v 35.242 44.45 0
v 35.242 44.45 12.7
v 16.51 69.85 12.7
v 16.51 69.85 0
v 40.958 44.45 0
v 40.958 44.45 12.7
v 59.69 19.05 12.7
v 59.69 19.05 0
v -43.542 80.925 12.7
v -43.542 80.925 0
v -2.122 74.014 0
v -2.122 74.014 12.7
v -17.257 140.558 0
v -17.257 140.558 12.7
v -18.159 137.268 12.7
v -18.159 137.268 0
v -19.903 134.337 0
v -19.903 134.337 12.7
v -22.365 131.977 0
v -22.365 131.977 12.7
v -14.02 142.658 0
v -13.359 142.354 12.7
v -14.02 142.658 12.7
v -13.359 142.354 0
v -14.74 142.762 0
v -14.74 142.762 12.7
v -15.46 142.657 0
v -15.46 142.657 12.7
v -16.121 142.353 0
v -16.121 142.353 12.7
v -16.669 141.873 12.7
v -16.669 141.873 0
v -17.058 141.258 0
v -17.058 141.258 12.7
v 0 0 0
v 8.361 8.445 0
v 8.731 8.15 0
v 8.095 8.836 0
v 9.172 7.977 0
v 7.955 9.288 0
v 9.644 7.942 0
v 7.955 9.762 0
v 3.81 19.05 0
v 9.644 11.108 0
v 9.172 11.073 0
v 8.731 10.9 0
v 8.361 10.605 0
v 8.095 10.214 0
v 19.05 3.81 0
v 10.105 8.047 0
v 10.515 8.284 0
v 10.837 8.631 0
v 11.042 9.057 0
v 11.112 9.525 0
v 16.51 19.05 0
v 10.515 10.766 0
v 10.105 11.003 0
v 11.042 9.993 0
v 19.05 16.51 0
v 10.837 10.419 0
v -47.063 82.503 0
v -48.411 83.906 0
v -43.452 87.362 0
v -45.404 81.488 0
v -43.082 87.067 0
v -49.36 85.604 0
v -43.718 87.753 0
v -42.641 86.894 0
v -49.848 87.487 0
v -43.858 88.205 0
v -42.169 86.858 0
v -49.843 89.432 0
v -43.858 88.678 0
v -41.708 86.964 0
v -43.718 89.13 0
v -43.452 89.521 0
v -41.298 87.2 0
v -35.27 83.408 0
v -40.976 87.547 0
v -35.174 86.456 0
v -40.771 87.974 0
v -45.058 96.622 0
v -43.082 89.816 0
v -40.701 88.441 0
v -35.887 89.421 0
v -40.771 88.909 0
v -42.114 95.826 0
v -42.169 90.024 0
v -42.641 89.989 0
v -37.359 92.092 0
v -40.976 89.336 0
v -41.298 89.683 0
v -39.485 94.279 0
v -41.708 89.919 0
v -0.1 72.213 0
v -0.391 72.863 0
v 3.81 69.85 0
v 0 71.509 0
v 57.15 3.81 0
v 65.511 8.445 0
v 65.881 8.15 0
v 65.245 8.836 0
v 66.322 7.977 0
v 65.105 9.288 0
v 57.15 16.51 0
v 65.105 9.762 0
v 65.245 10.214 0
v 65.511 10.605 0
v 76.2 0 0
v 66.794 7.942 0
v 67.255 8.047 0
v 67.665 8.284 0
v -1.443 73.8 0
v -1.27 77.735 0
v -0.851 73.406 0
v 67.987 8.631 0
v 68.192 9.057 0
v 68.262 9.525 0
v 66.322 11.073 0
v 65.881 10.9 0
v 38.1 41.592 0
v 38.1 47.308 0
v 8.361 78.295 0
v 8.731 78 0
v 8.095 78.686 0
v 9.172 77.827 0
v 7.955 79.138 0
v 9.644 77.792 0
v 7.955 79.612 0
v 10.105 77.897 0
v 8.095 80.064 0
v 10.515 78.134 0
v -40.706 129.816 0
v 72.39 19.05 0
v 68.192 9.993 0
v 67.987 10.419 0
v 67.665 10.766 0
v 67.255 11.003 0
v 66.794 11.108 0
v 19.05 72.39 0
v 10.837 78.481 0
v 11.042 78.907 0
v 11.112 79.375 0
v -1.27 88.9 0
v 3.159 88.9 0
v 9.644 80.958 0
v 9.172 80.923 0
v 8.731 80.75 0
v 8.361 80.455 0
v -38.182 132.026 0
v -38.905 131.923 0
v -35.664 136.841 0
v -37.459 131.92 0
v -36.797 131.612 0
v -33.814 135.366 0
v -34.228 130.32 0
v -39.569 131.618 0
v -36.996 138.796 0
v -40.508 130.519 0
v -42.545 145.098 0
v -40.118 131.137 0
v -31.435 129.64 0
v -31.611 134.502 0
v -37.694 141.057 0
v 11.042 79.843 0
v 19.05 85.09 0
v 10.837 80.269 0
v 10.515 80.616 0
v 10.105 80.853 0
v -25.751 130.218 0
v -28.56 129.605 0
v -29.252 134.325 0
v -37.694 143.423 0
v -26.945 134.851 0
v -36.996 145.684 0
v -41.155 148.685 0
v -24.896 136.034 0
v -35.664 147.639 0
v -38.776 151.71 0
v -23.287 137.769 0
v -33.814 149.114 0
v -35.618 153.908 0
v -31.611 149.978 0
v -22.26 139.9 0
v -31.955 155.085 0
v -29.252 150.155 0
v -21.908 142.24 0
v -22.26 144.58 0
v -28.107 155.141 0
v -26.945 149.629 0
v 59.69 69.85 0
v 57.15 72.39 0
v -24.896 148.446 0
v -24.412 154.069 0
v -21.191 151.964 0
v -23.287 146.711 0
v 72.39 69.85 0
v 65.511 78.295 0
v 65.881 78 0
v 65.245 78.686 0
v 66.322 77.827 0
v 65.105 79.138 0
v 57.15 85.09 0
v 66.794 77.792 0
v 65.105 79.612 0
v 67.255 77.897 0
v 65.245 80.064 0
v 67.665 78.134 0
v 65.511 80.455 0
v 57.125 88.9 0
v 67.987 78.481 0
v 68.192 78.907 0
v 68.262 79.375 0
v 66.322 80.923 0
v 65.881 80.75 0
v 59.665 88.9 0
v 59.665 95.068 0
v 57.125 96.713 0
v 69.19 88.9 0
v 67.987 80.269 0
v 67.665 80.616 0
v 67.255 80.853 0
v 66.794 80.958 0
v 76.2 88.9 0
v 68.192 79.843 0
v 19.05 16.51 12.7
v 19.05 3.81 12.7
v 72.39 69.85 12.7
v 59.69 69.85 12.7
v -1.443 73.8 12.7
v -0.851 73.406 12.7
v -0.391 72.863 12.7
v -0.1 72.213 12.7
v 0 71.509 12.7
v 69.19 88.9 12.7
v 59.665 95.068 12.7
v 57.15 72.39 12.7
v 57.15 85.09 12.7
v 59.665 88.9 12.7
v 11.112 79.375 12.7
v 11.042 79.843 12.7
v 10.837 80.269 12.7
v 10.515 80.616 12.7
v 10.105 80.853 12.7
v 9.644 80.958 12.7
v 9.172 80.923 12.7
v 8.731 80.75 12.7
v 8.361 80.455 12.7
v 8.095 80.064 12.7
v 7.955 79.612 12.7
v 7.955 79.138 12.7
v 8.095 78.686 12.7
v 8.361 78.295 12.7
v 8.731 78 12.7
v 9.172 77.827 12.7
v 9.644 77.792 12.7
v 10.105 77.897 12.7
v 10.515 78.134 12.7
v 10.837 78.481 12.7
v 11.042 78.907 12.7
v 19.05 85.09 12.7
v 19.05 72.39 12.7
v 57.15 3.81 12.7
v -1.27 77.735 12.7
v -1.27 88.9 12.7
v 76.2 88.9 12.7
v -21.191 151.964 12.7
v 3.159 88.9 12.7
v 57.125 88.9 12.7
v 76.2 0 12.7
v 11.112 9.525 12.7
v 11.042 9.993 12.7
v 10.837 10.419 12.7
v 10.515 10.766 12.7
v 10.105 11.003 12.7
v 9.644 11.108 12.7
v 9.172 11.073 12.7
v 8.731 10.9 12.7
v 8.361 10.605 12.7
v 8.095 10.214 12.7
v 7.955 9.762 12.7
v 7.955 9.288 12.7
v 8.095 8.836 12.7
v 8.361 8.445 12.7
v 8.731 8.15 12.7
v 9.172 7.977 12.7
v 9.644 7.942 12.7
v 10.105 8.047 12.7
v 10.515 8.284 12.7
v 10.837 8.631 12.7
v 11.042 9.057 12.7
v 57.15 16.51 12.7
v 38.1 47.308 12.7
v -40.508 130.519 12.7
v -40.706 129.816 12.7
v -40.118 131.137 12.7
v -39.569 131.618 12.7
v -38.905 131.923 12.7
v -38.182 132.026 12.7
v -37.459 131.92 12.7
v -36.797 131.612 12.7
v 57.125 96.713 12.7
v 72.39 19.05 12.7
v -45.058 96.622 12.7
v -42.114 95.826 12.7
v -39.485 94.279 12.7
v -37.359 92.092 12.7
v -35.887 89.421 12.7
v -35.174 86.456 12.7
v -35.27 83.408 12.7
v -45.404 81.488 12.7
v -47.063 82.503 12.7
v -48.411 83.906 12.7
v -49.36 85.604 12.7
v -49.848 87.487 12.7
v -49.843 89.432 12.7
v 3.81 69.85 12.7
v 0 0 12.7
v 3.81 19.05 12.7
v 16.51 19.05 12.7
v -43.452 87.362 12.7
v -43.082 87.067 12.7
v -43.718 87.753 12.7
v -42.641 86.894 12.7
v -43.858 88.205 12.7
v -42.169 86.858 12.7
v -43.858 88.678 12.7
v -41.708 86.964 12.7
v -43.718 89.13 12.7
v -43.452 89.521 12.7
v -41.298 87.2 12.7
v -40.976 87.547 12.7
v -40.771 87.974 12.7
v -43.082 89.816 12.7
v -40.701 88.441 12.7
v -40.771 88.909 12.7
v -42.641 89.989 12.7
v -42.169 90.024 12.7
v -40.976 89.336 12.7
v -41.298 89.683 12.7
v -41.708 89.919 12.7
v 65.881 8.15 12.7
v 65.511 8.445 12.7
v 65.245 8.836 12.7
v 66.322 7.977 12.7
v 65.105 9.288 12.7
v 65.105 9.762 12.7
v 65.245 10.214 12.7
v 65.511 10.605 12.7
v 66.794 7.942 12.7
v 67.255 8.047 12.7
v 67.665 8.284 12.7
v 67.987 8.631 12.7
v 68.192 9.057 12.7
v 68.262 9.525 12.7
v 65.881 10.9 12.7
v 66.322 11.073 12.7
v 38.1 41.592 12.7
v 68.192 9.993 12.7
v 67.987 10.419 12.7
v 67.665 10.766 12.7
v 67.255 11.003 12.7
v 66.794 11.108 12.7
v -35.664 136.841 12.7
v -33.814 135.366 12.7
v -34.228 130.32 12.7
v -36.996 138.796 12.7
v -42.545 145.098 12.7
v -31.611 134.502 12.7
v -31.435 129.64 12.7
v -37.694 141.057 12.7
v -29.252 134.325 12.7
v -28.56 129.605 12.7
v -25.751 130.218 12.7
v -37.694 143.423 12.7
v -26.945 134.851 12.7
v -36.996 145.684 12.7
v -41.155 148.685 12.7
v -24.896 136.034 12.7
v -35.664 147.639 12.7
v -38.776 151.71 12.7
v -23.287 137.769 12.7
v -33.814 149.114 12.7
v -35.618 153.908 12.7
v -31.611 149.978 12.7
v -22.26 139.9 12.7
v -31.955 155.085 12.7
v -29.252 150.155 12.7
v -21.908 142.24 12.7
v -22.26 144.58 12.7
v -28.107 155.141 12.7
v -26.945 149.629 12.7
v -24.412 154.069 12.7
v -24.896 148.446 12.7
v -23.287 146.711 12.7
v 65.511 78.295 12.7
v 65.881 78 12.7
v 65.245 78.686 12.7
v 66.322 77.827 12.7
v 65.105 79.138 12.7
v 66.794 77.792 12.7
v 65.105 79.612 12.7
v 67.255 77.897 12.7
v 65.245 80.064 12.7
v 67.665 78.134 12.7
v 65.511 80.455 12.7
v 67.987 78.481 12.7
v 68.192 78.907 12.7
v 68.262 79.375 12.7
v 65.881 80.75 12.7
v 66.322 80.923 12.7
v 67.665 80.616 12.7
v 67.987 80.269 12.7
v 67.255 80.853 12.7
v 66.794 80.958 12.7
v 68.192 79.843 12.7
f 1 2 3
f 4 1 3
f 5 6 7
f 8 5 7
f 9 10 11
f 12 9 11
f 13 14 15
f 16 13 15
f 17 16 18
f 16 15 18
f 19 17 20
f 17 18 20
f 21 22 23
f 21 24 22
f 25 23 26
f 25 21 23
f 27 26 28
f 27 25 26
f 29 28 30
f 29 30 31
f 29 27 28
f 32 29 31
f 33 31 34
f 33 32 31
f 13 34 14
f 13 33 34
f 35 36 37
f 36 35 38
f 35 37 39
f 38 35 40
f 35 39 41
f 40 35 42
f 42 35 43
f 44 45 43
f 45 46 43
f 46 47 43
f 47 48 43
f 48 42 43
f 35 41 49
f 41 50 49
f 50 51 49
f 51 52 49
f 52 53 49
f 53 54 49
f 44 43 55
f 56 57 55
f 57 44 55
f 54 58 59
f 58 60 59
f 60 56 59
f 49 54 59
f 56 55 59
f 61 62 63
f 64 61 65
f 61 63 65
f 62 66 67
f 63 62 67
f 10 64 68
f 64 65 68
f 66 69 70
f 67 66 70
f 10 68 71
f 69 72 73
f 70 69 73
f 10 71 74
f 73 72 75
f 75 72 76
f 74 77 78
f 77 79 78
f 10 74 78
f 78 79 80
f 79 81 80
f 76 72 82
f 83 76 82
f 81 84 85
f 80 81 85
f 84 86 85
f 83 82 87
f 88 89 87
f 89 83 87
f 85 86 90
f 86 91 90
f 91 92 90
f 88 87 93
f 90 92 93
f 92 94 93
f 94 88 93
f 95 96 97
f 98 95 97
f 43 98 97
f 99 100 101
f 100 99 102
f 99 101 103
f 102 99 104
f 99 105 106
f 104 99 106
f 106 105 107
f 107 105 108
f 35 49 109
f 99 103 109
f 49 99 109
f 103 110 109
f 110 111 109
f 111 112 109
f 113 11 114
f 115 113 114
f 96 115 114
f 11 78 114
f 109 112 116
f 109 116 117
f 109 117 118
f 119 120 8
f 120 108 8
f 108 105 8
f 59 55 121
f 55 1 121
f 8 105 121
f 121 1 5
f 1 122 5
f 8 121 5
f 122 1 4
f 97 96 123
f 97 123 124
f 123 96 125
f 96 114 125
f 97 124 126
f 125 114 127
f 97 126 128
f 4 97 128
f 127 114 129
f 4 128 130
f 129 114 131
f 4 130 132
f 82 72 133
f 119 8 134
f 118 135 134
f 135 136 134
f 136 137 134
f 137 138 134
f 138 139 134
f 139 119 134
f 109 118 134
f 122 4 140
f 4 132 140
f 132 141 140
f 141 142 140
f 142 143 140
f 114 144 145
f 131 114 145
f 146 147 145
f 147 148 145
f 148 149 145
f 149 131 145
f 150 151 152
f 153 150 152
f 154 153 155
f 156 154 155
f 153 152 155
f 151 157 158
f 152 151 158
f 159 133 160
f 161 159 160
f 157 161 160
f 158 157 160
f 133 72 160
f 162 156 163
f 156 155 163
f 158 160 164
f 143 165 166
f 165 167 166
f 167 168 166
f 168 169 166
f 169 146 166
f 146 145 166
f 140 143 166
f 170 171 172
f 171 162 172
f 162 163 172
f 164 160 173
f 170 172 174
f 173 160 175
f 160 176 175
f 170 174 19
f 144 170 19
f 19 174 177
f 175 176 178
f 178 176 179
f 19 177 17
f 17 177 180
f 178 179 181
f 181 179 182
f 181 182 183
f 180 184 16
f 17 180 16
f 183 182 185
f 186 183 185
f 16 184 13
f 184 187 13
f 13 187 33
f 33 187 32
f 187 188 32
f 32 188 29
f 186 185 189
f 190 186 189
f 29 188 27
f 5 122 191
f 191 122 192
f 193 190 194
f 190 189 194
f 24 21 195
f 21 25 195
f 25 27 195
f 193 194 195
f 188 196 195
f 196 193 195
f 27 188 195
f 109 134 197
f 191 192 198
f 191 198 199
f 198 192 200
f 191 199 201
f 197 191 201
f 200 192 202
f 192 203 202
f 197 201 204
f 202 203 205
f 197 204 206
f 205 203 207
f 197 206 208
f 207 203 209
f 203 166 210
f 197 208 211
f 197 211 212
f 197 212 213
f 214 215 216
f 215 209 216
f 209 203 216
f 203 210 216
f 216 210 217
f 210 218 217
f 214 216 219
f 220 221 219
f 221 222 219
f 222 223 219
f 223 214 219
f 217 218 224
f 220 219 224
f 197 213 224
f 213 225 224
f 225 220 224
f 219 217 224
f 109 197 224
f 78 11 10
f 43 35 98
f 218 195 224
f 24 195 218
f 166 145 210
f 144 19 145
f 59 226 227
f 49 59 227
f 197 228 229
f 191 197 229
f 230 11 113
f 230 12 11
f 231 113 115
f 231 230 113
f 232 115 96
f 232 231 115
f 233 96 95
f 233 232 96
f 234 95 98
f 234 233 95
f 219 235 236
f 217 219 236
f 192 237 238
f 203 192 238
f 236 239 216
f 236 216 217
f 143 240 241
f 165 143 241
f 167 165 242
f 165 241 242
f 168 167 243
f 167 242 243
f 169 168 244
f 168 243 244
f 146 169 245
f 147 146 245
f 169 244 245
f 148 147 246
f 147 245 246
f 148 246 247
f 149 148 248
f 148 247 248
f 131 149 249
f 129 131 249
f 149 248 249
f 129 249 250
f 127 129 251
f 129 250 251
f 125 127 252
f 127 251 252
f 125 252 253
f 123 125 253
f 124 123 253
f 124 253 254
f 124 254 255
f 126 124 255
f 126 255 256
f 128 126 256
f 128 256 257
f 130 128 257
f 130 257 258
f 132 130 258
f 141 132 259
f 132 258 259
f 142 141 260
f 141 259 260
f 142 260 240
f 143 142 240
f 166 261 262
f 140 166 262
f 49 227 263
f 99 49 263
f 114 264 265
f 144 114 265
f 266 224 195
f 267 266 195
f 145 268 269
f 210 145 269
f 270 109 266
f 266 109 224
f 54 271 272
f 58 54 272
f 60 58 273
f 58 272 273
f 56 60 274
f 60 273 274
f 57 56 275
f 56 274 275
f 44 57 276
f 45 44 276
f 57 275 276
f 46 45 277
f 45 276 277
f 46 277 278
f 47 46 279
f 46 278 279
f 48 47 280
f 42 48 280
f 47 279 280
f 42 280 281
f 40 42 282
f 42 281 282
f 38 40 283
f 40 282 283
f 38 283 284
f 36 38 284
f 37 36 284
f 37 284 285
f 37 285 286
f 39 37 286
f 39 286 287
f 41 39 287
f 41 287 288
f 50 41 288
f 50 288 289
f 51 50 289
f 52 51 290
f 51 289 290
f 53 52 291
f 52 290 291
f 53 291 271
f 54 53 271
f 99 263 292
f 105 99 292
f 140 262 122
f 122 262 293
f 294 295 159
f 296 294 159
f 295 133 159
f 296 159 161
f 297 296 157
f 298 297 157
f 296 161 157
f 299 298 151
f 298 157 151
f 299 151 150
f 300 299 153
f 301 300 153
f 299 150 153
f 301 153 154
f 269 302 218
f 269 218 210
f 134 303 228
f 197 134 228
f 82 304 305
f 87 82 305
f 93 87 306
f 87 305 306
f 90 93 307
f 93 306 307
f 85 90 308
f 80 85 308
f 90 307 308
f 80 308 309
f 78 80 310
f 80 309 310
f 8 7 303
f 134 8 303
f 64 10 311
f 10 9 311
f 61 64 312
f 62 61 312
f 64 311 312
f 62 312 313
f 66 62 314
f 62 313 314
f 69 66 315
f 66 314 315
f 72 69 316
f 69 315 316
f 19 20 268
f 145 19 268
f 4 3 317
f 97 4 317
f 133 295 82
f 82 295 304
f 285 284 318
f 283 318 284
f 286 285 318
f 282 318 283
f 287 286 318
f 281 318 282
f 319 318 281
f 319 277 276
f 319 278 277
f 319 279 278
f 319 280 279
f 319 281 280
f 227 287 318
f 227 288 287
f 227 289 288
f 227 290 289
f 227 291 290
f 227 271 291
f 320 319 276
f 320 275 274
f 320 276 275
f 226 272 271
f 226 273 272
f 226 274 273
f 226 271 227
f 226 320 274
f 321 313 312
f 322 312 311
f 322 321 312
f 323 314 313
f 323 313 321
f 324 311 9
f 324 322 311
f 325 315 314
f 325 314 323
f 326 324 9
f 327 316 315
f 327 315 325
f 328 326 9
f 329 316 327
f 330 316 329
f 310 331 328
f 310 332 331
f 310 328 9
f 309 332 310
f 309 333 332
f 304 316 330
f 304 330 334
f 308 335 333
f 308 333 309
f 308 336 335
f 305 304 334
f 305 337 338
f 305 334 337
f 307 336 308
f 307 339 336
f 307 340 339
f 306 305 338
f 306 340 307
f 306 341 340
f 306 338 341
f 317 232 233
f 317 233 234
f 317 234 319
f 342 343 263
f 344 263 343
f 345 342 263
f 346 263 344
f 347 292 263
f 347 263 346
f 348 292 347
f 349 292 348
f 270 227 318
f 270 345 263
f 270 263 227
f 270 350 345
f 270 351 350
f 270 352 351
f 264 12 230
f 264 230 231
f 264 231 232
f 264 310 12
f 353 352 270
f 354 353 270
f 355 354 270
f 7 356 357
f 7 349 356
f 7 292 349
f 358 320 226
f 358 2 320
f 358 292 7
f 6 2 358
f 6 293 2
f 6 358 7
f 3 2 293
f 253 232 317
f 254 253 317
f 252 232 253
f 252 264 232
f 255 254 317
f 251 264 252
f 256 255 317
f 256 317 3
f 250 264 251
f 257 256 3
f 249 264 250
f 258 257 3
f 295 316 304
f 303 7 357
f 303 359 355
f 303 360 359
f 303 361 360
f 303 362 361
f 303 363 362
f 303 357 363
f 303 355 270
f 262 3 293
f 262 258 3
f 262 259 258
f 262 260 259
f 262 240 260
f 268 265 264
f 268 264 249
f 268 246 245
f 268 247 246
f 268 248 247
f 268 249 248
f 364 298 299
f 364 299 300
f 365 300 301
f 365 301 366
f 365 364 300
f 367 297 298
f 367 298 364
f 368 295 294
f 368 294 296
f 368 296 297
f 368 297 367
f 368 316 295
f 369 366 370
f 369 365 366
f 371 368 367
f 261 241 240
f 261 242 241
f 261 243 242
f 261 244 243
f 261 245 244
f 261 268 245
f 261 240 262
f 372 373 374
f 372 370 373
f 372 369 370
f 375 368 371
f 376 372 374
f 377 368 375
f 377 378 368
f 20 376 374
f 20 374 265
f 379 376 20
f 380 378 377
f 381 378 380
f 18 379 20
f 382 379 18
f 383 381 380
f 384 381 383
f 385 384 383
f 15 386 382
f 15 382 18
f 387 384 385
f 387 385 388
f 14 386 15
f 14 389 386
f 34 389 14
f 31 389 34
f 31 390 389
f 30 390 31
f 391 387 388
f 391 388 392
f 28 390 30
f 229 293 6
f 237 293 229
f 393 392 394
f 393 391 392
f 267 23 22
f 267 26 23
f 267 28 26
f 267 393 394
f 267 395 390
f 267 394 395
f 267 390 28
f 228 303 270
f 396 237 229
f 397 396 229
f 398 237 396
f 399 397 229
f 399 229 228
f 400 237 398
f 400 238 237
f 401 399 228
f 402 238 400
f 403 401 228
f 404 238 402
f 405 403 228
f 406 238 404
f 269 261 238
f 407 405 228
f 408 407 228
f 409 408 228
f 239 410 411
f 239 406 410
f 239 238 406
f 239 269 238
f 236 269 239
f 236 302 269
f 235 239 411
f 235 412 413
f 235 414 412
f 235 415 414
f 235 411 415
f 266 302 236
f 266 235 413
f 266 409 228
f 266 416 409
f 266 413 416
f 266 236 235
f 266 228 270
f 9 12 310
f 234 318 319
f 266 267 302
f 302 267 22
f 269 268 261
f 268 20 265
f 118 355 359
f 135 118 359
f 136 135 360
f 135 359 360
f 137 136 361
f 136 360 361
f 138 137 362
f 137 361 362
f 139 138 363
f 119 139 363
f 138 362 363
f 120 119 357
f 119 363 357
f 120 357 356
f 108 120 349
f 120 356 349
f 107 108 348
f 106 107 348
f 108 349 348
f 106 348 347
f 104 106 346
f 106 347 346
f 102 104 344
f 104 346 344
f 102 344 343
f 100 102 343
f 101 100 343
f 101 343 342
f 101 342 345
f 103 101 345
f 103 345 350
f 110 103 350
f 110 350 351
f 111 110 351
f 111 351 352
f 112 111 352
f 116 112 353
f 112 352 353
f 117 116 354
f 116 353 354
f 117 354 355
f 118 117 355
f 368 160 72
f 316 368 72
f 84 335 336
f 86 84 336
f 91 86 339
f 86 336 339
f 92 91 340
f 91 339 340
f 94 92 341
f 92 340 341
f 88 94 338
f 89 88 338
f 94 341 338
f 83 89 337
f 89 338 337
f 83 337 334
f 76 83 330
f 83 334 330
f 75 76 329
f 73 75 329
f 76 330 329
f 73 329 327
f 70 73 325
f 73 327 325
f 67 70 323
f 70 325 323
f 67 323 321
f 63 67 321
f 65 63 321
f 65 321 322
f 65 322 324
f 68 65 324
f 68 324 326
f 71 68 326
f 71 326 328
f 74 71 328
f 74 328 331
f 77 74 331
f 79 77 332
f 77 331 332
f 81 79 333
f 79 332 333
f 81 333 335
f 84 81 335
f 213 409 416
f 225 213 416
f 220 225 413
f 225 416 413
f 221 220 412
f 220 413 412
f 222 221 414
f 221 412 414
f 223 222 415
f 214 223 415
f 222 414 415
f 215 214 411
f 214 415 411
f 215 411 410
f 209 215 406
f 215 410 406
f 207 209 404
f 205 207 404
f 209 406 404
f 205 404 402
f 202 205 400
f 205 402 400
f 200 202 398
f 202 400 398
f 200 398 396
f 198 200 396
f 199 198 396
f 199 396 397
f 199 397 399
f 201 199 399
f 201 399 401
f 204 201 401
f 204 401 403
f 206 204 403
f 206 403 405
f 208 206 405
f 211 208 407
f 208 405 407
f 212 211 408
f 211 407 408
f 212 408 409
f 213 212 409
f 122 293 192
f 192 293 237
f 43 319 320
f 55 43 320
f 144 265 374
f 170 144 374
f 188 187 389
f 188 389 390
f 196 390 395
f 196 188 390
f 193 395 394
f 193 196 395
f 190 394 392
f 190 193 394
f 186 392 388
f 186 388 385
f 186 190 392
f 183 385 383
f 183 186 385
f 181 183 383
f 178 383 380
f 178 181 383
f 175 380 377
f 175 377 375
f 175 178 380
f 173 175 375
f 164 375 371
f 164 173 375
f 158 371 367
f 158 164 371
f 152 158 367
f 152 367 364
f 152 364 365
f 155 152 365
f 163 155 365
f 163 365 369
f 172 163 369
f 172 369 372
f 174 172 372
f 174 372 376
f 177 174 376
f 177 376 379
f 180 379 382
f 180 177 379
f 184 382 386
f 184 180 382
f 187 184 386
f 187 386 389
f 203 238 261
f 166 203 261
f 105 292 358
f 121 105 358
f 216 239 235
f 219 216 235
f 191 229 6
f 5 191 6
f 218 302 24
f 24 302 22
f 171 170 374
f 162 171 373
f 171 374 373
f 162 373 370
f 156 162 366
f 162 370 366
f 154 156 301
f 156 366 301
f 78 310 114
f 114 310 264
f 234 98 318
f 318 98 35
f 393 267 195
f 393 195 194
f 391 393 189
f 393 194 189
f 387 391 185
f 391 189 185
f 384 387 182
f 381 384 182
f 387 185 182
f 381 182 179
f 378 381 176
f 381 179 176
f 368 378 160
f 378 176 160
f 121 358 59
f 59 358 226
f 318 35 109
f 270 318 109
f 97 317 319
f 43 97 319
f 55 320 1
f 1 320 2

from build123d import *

# Parameters (mm, degrees)
SKETCH1_R           = 7.9375
BOSS_EXTRUDE1_DEPTH = 12.7
CUT_EXTRUDE1_DEPTH  = 12.7
SKETCH3_R           = 1.5875
CUT_EXTRUDE2_DEPTH  = 12.7
CUT_EXTRUDE3_DEPTH  = 12.7
FILLET1_R           = 2.54
BOSS_EXTRUDE2_DEPTH = 12.7
SKETCH6_R           = 1.5875
CUT_EXTRUDE4_DEPTH  = 12.7
FILLET2_R           = 7.62
FILLET3_R           = 2.54


with BuildPart() as part:
    # Sketch1 → Boss-Extrude1 (new body)
    with BuildSketch(Plane.XY):
        with BuildLine():
            Line((0, 0), (76.2, 0))
            Line((76.2, 0), (76.2, 88.9))
            Line((76.2, 88.9), (-21.190795437, 151.964199177))
            ThreePointArc((-21.190795437, 151.964199177), (-33.829972343, 154.632550249), (-42.545, 145.0975))
            Line((-42.545, 145.0975), (-50.8, 82.136361391))
            Line((-50.8, 82.136361391), (0, 73.66))
            Line((0, 73.66), (0, 0))
        make_face()
        with Locations((-29.845, 142.24)):
            Circle(SKETCH1_R, mode=Mode.SUBTRACT)
    extrude(amount=BOSS_EXTRUDE1_DEPTH)

    # Sketch2 → Cut-Extrude1 (cut)
    with BuildSketch(Plane.XY.offset(12.7)):
        Polygon((19.05, 3.81), (57.15, 3.81), (57.15, 16.51), (38.1, 41.5925), (19.05, 16.51), align=None)
        Polygon((3.81, 19.05), (16.51, 19.05), (35.2425, 44.45), (16.51, 69.85), (3.81, 69.85), align=None)
        Polygon((19.05, 85.09), (19.05, 72.39), (38.1, 47.3075), (57.15, 72.39), (57.15, 85.09), align=None)
        Polygon((72.39, 69.85), (59.69, 69.85), (40.9575, 44.45), (59.69, 19.05), (72.39, 19.05), align=None)
    extrude(amount=-CUT_EXTRUDE1_DEPTH, mode=Mode.SUBTRACT)

    # Sketch3 → Cut-Extrude2 (cut)
    with BuildSketch(Plane.XY.offset(12.7)):
        with Locations((66.675, 79.375)):
            Circle(SKETCH3_R)
        with Locations((9.525, 79.375)):
            Circle(SKETCH3_R)
        with Locations((9.525, 9.525)):
            Circle(SKETCH3_R)
        with Locations((66.675, 9.525)):
            Circle(SKETCH3_R)
    extrude(amount=-CUT_EXTRUDE2_DEPTH, mode=Mode.SUBTRACT)

    # Sketch4 → Cut-Extrude3 (cut)
    with BuildSketch(Plane.XY.offset(12.7)):
        with BuildLine():
            Line((69.190325437, 88.9), (-17.449031417, 145.002238745))
            ThreePointArc((-17.449031417, 145.002238745), (-17.963027163, 137.755725085), (-22.364956463, 131.976523558))
            Line((-22.364956463, 131.976523558), (3.158582938, 88.9))
            Line((3.158582938, 88.9), (69.190325437, 88.9))
        make_face()
        with BuildLine():
            Line((-40.065465421, 134.701294104), (-45.058154169, 96.621903635))
            ThreePointArc((-45.058154169, 96.621903635), (-37.359379788, 92.092328445), (-35.269920717, 83.407724876))
            Line((-35.269920717, 83.407724876), (-1.27, 77.734582843))
            Line((-1.27, 77.734582843), (-1.27, 88.9))
            Line((-1.27, 88.9), (-25.751473381, 130.217810523))
            ThreePointArc((-25.751473381, 130.217810523), (-33.641083643, 130.12060443), (-40.065465421, 134.701294104))
        make_face()
    extrude(amount=-CUT_EXTRUDE3_DEPTH, mode=Mode.SUBTRACT)

    # Fillet1
    fillet1_edges = [part.edges().sort_by_distance(p)[0] for p in [
        (-40.065465421, 134.701294104, 6.35),
        (-17.449031417, 145.002238745, 6.35),
    ]]
    fillet(fillet1_edges, radius=FILLET1_R)

    # Sketch5 → Boss-Extrude2 (add)
    with BuildSketch(Plane.XY.offset(12.7)):
        Polygon((57.125325437, 88.9), (59.665325437, 88.9), (59.665325437, 95.06779537), (57.125325437, 96.712540802), align=None)
    extrude(amount=-BOSS_EXTRUDE2_DEPTH)

    # Sketch6 → Cut-Extrude4 (cut)
    with BuildSketch(Plane.XY.offset(12.7)):
        with Locations((-42.288108338, 88.441435979)):
            Circle(SKETCH6_R)
    extrude(amount=-CUT_EXTRUDE4_DEPTH, mode=Mode.SUBTRACT)

    # Fillet2
    fillet2_edges = [part.edges().sort_by_distance(p)[0] for p in [
        (-50.8, 82.136361391, 6.35),
    ]]
    fillet(fillet2_edges, radius=FILLET2_R)

    # Fillet3
    fillet3_edges = [part.edges().sort_by_distance(p)[0] for p in [
        (0, 73.66, 6.35),
    ]]
    fillet(fillet3_edges, radius=FILLET3_R)


solid = part.part
